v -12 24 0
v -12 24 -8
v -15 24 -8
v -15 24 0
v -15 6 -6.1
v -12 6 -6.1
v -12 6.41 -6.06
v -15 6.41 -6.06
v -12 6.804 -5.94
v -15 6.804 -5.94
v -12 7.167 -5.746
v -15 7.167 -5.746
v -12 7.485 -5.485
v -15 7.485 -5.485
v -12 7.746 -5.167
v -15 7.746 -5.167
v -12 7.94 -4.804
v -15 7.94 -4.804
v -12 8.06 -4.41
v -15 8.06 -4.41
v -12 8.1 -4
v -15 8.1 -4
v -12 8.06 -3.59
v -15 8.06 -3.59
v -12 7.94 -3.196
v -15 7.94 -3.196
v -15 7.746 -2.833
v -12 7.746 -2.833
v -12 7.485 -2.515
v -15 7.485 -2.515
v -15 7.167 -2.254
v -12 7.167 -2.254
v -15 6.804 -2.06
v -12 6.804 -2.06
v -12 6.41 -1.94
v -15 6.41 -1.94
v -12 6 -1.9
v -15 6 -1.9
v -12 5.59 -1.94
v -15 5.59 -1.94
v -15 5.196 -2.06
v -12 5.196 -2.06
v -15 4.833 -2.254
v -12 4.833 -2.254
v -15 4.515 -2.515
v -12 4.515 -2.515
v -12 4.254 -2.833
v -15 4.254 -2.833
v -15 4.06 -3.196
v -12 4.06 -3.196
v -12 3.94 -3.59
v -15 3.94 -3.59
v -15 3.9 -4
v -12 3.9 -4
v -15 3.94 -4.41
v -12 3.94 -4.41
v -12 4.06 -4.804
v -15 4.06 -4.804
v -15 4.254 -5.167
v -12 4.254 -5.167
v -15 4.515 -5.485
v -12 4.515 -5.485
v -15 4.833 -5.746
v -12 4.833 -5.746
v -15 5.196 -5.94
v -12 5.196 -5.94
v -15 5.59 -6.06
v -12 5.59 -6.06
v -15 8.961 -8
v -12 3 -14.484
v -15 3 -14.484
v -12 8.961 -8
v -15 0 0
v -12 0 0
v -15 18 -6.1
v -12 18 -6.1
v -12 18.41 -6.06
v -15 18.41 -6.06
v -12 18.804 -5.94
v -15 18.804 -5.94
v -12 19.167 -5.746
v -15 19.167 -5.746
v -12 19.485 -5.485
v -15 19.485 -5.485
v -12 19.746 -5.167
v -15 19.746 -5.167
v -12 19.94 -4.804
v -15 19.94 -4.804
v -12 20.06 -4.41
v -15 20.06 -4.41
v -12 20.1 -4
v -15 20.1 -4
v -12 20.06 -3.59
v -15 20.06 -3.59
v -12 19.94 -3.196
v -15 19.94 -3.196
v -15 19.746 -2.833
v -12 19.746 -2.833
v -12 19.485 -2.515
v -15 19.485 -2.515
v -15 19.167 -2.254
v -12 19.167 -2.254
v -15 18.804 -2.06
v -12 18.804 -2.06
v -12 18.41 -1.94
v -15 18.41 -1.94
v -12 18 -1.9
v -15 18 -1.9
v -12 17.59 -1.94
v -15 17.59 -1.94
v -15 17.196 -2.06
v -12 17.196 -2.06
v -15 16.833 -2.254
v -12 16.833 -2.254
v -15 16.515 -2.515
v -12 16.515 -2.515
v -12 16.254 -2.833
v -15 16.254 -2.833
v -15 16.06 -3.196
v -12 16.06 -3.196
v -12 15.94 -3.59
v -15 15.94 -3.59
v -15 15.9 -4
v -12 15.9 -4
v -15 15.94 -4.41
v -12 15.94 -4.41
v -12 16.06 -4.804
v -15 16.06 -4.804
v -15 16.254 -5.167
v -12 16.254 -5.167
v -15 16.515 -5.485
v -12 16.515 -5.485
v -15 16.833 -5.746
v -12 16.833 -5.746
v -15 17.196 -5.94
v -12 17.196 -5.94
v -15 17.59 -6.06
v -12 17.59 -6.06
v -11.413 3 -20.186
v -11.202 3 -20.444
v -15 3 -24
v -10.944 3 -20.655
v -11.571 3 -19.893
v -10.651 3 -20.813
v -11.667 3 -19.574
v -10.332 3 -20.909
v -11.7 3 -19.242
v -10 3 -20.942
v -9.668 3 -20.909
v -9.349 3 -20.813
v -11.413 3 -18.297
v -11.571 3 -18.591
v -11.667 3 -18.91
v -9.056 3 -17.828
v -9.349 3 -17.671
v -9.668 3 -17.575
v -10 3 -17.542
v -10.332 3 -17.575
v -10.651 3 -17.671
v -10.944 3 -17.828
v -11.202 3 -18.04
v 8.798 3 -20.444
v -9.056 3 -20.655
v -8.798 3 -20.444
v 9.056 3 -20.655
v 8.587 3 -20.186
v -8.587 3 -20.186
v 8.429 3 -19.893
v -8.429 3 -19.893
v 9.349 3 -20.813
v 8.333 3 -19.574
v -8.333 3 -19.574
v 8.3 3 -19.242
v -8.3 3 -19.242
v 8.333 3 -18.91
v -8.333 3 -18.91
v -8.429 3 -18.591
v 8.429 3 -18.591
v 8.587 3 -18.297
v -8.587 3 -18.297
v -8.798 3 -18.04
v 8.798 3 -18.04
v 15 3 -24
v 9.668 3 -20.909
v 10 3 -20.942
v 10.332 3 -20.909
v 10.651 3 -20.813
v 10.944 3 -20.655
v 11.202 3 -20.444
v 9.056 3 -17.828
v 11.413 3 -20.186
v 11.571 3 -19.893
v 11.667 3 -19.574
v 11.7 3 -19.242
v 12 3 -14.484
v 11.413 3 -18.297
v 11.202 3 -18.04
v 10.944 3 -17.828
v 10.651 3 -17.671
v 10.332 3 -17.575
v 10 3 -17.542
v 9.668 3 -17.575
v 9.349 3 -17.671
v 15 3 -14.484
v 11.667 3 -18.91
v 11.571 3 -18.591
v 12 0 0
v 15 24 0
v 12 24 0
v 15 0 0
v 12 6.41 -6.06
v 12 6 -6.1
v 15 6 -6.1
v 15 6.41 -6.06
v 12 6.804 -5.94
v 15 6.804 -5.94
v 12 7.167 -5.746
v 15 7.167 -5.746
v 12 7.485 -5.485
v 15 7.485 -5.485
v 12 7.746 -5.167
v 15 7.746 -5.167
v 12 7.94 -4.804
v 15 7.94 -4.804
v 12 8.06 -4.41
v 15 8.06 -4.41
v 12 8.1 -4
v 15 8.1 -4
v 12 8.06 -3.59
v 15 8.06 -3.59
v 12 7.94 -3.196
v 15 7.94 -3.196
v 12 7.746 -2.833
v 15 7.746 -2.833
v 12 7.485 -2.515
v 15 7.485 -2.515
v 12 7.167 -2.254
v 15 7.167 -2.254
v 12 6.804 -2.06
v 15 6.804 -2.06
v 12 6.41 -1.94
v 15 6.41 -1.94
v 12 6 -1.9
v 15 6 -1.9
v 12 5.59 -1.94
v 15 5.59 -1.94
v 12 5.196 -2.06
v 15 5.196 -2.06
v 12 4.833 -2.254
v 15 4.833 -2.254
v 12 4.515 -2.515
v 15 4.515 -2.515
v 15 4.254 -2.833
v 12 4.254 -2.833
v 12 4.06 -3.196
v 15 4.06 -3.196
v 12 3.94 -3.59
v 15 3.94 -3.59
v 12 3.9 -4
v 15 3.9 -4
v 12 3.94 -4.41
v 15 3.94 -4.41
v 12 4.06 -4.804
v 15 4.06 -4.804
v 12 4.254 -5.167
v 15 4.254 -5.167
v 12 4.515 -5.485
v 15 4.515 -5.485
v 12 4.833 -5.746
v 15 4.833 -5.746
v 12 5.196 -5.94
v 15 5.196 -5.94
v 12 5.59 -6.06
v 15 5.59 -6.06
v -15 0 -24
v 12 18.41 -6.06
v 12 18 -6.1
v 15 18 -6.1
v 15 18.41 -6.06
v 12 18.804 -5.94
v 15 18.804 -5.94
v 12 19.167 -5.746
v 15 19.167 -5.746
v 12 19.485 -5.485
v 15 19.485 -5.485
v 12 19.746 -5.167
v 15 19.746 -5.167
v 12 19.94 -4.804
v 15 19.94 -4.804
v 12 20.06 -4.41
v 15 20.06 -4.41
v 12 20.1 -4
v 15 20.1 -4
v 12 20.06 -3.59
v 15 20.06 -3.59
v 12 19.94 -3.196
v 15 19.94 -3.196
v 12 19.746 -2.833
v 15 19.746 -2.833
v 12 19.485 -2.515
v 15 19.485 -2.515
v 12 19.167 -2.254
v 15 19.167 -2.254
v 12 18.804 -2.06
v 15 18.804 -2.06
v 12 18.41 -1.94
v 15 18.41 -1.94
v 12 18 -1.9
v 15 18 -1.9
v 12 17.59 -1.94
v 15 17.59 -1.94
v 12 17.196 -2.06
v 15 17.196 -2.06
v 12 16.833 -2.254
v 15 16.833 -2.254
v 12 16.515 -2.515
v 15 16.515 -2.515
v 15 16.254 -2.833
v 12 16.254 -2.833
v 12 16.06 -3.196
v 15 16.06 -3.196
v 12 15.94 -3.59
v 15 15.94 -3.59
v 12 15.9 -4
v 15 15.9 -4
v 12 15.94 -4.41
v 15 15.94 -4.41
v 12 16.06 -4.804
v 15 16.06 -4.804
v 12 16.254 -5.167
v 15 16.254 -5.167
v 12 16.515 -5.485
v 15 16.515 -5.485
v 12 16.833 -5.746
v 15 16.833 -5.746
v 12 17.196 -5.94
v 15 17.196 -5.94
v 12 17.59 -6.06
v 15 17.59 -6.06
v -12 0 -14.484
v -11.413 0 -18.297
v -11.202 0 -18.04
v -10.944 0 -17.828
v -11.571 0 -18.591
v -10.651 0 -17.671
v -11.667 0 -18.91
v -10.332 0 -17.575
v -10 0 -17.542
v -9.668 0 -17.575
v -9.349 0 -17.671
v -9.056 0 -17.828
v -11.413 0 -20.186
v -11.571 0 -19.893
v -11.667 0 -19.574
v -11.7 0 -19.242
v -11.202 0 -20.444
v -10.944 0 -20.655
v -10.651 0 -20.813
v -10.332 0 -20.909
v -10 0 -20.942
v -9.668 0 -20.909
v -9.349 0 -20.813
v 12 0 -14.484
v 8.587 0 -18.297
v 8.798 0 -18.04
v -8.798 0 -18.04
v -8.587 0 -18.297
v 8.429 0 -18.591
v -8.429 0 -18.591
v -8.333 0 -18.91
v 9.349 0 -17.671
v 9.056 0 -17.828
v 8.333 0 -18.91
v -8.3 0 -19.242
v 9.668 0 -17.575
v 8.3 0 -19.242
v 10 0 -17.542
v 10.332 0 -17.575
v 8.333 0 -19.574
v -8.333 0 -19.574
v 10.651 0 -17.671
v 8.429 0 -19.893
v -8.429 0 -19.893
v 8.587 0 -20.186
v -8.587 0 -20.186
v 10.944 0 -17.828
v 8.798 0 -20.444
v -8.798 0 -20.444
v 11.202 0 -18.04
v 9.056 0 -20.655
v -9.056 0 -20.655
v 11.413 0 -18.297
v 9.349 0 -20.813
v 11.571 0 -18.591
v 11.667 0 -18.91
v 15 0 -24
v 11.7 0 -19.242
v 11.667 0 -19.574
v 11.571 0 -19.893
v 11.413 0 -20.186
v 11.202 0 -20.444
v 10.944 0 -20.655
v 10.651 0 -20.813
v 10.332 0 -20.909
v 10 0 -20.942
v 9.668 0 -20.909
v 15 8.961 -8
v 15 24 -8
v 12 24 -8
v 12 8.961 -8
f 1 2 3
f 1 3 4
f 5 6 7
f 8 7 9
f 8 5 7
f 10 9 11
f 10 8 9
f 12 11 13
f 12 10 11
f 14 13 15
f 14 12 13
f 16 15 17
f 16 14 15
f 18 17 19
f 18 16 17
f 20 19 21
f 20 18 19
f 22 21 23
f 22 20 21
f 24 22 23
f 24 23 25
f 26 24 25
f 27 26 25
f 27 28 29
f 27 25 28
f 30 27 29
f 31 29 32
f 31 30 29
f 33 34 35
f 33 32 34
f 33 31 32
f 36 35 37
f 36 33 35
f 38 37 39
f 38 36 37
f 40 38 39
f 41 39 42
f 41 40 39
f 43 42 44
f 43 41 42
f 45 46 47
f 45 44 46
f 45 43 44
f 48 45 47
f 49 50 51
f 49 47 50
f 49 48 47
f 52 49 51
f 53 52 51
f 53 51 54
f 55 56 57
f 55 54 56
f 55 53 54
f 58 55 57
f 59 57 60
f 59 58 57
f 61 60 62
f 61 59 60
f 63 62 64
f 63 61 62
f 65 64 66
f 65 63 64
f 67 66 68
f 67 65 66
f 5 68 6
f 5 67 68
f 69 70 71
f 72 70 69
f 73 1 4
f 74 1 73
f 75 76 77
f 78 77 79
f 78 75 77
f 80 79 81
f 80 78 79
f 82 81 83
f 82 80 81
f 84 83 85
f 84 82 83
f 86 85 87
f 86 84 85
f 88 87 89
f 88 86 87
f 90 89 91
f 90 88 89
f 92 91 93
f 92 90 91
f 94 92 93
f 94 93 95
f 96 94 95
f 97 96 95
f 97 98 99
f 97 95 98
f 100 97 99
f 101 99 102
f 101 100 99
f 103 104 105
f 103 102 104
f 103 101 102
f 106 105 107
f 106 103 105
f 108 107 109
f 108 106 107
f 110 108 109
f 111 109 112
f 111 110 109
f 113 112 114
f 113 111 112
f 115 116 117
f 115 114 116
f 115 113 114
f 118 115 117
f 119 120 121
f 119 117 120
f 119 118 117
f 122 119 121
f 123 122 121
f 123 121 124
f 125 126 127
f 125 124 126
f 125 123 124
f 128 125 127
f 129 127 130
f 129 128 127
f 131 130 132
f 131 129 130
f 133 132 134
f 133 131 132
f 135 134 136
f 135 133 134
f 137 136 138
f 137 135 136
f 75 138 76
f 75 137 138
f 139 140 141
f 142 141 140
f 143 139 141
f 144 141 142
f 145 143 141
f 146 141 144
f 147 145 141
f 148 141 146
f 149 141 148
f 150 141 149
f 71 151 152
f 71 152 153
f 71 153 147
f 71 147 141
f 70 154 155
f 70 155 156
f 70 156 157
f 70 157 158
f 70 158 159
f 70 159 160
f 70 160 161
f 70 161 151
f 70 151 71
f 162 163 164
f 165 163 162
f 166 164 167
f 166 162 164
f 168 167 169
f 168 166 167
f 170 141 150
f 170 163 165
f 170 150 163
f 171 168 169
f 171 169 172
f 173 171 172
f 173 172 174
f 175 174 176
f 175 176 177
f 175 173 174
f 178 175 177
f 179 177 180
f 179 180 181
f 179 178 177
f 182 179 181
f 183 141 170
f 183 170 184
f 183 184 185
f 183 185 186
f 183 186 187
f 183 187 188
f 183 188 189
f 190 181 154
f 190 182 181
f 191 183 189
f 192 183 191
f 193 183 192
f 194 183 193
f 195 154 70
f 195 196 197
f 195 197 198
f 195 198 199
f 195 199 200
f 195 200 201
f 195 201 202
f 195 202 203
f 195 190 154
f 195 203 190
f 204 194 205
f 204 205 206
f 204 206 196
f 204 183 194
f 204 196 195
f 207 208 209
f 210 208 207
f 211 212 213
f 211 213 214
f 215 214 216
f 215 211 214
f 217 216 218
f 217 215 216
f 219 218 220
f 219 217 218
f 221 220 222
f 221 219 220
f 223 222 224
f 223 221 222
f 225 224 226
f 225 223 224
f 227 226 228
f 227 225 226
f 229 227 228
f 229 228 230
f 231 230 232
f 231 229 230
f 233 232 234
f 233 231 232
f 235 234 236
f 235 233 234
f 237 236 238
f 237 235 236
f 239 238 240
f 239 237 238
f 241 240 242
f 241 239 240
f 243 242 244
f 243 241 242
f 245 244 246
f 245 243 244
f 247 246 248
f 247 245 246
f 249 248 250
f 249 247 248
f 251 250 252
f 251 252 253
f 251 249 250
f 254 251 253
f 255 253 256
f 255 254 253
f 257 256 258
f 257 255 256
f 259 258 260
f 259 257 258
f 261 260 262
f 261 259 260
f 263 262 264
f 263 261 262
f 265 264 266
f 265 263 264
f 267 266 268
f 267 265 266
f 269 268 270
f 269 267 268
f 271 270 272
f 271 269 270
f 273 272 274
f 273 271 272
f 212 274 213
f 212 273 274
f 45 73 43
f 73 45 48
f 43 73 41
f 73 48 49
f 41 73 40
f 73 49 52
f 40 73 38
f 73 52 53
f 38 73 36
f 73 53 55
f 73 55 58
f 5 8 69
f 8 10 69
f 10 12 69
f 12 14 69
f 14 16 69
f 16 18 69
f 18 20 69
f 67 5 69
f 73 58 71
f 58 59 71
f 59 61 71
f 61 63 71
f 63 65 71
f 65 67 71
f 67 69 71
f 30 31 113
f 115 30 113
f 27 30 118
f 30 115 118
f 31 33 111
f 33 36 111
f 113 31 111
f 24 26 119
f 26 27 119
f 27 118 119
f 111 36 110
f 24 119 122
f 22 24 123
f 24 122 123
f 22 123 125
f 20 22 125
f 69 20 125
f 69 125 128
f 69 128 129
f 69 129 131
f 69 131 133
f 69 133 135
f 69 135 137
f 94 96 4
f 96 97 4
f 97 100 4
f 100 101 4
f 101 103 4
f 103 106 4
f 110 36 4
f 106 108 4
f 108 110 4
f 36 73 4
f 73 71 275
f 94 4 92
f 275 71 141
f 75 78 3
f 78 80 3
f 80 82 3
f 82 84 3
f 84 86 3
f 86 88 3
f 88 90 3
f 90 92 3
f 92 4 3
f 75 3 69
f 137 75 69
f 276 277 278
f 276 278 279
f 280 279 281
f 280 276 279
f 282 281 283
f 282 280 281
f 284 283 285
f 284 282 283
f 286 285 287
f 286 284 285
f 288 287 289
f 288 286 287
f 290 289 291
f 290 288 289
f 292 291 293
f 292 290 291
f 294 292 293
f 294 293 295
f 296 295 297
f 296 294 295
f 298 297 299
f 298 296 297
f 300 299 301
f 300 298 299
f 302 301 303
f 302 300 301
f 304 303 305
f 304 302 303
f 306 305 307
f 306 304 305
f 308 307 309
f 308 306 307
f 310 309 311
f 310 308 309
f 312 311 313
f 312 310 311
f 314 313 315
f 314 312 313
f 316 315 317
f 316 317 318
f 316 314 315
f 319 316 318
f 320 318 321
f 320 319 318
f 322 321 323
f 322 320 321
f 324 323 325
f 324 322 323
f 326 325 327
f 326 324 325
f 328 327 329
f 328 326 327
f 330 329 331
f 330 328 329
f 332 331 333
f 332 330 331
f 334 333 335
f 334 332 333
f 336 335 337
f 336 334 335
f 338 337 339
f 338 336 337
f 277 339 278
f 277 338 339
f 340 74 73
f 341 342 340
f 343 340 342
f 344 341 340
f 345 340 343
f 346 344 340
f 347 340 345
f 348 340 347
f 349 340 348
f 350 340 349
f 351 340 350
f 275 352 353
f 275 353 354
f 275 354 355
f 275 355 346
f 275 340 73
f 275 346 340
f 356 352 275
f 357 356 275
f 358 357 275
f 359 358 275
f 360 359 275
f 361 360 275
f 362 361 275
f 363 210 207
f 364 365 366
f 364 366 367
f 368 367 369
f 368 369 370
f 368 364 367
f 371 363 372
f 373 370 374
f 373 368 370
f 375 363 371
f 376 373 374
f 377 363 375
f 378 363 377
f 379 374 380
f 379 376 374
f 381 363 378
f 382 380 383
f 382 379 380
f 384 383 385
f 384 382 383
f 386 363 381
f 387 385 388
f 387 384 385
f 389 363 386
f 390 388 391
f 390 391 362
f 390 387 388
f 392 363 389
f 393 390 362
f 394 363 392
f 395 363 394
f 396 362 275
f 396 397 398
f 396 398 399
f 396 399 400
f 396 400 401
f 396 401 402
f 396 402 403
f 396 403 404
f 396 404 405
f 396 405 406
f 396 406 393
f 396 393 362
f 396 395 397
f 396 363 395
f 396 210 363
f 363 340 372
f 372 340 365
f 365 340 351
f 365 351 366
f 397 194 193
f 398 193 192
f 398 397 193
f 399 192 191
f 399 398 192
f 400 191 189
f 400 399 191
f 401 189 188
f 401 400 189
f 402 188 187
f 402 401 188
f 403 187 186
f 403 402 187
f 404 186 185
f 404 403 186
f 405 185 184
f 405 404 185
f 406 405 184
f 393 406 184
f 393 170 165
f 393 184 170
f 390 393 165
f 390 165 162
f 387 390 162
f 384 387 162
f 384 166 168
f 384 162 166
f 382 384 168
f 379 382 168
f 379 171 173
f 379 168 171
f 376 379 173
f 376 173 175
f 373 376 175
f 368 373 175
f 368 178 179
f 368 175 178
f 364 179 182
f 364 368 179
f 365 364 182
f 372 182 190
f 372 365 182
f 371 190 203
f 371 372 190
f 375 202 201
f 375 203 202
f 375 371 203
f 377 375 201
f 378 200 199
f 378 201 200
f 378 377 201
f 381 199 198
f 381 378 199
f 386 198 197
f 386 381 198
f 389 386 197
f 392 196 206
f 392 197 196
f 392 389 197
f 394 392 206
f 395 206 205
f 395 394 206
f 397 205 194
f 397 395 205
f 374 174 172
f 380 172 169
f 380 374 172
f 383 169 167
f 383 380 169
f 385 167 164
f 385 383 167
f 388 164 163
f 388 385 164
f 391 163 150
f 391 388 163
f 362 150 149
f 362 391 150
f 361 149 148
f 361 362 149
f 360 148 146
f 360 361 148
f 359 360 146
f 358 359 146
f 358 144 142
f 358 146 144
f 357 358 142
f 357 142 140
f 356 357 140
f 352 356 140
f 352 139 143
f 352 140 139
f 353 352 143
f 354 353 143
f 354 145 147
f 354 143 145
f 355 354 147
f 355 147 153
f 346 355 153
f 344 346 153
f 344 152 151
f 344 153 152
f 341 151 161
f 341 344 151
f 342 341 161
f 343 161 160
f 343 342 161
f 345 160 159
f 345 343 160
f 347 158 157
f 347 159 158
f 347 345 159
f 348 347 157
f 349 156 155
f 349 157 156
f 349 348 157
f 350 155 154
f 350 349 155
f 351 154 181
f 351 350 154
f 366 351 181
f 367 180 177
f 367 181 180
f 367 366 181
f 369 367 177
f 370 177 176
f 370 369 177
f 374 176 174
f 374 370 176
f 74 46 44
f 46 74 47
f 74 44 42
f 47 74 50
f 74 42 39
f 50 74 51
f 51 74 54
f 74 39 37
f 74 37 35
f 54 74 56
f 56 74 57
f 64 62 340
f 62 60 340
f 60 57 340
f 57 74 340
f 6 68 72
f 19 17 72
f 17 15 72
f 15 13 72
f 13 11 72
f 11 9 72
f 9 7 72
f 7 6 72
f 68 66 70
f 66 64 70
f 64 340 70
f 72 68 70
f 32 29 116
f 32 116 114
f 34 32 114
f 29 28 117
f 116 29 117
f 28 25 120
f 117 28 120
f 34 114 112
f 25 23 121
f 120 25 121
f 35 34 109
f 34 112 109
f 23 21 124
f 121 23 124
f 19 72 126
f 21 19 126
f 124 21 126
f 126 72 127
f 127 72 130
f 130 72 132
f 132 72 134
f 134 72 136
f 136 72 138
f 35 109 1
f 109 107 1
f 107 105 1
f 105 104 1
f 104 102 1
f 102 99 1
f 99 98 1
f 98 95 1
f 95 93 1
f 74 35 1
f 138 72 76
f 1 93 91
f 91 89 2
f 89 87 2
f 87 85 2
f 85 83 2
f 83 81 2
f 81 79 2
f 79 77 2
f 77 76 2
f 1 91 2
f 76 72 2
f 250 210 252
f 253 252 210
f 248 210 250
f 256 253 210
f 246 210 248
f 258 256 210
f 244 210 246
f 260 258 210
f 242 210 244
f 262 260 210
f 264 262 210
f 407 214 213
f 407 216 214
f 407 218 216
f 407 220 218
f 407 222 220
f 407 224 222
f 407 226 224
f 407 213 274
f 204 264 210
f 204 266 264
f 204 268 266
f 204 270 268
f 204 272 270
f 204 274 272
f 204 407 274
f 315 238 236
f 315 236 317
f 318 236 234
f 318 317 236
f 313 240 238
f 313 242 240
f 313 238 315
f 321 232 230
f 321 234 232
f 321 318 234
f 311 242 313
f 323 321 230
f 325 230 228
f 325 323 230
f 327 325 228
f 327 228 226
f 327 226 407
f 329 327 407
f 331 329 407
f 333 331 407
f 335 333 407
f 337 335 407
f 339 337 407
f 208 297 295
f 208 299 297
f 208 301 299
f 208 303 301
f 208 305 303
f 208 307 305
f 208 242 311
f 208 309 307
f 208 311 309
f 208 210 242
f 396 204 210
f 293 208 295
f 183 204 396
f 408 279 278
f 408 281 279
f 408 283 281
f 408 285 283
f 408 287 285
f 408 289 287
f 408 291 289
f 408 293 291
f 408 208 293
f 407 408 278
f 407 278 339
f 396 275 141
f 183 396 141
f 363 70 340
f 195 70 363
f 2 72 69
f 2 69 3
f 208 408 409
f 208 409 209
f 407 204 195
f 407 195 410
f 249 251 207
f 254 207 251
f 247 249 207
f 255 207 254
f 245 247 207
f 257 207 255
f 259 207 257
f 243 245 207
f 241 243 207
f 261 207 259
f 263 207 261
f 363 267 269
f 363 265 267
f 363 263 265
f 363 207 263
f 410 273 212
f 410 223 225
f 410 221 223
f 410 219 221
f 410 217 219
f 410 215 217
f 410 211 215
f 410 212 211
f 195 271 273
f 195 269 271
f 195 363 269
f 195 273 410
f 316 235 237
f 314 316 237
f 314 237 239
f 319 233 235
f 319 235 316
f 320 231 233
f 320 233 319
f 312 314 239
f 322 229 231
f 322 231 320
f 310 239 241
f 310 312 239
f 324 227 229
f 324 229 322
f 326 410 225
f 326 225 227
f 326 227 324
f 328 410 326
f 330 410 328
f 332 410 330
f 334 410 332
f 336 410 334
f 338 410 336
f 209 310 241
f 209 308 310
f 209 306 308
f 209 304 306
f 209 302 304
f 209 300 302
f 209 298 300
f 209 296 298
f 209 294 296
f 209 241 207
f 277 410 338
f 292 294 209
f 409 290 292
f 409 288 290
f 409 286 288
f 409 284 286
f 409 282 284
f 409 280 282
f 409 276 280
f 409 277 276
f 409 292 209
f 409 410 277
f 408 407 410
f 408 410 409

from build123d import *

# Parameters (mm, degrees)
SKETCH1_R           = 2.1
BOSS_EXTRUDE1_DEPTH = 15
CUT_EXTRUDE3_START  = -14.483913
SKETCH2_W           = 24
SKETCH2_H           = 24
CUT_EXTRUDE3_DEPTH  = 14.483913
CUT_EXTRUDE4_REACH  = 26
SKETCH3_R           = 1.7


with BuildPart() as part:
    # Sketch1 → Boss-Extrude1 (new body, symmetric)
    with BuildSketch(Plane(origin=(0, 0, 0), x_dir=(0, 0, -1), z_dir=(1, 0, 0))):
        Polygon((0, 0), (24, 0), (24, 3), (14.483913001, 3), (8, 8.960936807), (8, 24), (0, 24), align=None)
        with Locations((4, 6)):
            Circle(SKETCH1_R, mode=Mode.SUBTRACT)
        with Locations((4, 18)):
            Circle(SKETCH1_R, mode=Mode.SUBTRACT)
    extrude(amount=BOSS_EXTRUDE1_DEPTH, both=True)

    # Sketch2 → Cut-Extrude3 (cut)
    with BuildSketch(Plane.XY.offset(CUT_EXTRUDE3_START)):
        with Locations((0, 12)):
            Rectangle(SKETCH2_W, SKETCH2_H)
    extrude(amount=CUT_EXTRUDE3_DEPTH, mode=Mode.SUBTRACT)

    # Sketch3 → Cut-Extrude4 (cut, up to next)
    with BuildSketch(Plane(origin=(0, 0, 0), x_dir=(1, 0, 0), z_dir=(0, 1, 0)), mode=Mode.PRIVATE) as cut_extrude4_sk1:
        with Locations((-10, 19.241956501)):
            Circle(SKETCH3_R)
    cut_extrude4_tool1 = extrude(cut_extrude4_sk1.sketch, amount=CUT_EXTRUDE4_REACH, mode=Mode.PRIVATE) & part.part
    add(cut_extrude4_tool1.solids().sort_by_distance((-10, 0, -19.241957))[0], mode=Mode.SUBTRACT)
    # Sketch3 → Cut-Extrude4 (cut, up to next)
    with BuildSketch(Plane(origin=(0, 0, 0), x_dir=(1, 0, 0), z_dir=(0, 1, 0)), mode=Mode.PRIVATE) as cut_extrude4_sk2:
        with Locations((10, 19.241956501)):
            Circle(SKETCH3_R)
    cut_extrude4_tool2 = extrude(cut_extrude4_sk2.sketch, amount=CUT_EXTRUDE4_REACH, mode=Mode.PRIVATE) & part.part
    add(cut_extrude4_tool2.solids().sort_by_distance((10, 0, -19.241957))[0], mode=Mode.SUBTRACT)


solid = part.part
